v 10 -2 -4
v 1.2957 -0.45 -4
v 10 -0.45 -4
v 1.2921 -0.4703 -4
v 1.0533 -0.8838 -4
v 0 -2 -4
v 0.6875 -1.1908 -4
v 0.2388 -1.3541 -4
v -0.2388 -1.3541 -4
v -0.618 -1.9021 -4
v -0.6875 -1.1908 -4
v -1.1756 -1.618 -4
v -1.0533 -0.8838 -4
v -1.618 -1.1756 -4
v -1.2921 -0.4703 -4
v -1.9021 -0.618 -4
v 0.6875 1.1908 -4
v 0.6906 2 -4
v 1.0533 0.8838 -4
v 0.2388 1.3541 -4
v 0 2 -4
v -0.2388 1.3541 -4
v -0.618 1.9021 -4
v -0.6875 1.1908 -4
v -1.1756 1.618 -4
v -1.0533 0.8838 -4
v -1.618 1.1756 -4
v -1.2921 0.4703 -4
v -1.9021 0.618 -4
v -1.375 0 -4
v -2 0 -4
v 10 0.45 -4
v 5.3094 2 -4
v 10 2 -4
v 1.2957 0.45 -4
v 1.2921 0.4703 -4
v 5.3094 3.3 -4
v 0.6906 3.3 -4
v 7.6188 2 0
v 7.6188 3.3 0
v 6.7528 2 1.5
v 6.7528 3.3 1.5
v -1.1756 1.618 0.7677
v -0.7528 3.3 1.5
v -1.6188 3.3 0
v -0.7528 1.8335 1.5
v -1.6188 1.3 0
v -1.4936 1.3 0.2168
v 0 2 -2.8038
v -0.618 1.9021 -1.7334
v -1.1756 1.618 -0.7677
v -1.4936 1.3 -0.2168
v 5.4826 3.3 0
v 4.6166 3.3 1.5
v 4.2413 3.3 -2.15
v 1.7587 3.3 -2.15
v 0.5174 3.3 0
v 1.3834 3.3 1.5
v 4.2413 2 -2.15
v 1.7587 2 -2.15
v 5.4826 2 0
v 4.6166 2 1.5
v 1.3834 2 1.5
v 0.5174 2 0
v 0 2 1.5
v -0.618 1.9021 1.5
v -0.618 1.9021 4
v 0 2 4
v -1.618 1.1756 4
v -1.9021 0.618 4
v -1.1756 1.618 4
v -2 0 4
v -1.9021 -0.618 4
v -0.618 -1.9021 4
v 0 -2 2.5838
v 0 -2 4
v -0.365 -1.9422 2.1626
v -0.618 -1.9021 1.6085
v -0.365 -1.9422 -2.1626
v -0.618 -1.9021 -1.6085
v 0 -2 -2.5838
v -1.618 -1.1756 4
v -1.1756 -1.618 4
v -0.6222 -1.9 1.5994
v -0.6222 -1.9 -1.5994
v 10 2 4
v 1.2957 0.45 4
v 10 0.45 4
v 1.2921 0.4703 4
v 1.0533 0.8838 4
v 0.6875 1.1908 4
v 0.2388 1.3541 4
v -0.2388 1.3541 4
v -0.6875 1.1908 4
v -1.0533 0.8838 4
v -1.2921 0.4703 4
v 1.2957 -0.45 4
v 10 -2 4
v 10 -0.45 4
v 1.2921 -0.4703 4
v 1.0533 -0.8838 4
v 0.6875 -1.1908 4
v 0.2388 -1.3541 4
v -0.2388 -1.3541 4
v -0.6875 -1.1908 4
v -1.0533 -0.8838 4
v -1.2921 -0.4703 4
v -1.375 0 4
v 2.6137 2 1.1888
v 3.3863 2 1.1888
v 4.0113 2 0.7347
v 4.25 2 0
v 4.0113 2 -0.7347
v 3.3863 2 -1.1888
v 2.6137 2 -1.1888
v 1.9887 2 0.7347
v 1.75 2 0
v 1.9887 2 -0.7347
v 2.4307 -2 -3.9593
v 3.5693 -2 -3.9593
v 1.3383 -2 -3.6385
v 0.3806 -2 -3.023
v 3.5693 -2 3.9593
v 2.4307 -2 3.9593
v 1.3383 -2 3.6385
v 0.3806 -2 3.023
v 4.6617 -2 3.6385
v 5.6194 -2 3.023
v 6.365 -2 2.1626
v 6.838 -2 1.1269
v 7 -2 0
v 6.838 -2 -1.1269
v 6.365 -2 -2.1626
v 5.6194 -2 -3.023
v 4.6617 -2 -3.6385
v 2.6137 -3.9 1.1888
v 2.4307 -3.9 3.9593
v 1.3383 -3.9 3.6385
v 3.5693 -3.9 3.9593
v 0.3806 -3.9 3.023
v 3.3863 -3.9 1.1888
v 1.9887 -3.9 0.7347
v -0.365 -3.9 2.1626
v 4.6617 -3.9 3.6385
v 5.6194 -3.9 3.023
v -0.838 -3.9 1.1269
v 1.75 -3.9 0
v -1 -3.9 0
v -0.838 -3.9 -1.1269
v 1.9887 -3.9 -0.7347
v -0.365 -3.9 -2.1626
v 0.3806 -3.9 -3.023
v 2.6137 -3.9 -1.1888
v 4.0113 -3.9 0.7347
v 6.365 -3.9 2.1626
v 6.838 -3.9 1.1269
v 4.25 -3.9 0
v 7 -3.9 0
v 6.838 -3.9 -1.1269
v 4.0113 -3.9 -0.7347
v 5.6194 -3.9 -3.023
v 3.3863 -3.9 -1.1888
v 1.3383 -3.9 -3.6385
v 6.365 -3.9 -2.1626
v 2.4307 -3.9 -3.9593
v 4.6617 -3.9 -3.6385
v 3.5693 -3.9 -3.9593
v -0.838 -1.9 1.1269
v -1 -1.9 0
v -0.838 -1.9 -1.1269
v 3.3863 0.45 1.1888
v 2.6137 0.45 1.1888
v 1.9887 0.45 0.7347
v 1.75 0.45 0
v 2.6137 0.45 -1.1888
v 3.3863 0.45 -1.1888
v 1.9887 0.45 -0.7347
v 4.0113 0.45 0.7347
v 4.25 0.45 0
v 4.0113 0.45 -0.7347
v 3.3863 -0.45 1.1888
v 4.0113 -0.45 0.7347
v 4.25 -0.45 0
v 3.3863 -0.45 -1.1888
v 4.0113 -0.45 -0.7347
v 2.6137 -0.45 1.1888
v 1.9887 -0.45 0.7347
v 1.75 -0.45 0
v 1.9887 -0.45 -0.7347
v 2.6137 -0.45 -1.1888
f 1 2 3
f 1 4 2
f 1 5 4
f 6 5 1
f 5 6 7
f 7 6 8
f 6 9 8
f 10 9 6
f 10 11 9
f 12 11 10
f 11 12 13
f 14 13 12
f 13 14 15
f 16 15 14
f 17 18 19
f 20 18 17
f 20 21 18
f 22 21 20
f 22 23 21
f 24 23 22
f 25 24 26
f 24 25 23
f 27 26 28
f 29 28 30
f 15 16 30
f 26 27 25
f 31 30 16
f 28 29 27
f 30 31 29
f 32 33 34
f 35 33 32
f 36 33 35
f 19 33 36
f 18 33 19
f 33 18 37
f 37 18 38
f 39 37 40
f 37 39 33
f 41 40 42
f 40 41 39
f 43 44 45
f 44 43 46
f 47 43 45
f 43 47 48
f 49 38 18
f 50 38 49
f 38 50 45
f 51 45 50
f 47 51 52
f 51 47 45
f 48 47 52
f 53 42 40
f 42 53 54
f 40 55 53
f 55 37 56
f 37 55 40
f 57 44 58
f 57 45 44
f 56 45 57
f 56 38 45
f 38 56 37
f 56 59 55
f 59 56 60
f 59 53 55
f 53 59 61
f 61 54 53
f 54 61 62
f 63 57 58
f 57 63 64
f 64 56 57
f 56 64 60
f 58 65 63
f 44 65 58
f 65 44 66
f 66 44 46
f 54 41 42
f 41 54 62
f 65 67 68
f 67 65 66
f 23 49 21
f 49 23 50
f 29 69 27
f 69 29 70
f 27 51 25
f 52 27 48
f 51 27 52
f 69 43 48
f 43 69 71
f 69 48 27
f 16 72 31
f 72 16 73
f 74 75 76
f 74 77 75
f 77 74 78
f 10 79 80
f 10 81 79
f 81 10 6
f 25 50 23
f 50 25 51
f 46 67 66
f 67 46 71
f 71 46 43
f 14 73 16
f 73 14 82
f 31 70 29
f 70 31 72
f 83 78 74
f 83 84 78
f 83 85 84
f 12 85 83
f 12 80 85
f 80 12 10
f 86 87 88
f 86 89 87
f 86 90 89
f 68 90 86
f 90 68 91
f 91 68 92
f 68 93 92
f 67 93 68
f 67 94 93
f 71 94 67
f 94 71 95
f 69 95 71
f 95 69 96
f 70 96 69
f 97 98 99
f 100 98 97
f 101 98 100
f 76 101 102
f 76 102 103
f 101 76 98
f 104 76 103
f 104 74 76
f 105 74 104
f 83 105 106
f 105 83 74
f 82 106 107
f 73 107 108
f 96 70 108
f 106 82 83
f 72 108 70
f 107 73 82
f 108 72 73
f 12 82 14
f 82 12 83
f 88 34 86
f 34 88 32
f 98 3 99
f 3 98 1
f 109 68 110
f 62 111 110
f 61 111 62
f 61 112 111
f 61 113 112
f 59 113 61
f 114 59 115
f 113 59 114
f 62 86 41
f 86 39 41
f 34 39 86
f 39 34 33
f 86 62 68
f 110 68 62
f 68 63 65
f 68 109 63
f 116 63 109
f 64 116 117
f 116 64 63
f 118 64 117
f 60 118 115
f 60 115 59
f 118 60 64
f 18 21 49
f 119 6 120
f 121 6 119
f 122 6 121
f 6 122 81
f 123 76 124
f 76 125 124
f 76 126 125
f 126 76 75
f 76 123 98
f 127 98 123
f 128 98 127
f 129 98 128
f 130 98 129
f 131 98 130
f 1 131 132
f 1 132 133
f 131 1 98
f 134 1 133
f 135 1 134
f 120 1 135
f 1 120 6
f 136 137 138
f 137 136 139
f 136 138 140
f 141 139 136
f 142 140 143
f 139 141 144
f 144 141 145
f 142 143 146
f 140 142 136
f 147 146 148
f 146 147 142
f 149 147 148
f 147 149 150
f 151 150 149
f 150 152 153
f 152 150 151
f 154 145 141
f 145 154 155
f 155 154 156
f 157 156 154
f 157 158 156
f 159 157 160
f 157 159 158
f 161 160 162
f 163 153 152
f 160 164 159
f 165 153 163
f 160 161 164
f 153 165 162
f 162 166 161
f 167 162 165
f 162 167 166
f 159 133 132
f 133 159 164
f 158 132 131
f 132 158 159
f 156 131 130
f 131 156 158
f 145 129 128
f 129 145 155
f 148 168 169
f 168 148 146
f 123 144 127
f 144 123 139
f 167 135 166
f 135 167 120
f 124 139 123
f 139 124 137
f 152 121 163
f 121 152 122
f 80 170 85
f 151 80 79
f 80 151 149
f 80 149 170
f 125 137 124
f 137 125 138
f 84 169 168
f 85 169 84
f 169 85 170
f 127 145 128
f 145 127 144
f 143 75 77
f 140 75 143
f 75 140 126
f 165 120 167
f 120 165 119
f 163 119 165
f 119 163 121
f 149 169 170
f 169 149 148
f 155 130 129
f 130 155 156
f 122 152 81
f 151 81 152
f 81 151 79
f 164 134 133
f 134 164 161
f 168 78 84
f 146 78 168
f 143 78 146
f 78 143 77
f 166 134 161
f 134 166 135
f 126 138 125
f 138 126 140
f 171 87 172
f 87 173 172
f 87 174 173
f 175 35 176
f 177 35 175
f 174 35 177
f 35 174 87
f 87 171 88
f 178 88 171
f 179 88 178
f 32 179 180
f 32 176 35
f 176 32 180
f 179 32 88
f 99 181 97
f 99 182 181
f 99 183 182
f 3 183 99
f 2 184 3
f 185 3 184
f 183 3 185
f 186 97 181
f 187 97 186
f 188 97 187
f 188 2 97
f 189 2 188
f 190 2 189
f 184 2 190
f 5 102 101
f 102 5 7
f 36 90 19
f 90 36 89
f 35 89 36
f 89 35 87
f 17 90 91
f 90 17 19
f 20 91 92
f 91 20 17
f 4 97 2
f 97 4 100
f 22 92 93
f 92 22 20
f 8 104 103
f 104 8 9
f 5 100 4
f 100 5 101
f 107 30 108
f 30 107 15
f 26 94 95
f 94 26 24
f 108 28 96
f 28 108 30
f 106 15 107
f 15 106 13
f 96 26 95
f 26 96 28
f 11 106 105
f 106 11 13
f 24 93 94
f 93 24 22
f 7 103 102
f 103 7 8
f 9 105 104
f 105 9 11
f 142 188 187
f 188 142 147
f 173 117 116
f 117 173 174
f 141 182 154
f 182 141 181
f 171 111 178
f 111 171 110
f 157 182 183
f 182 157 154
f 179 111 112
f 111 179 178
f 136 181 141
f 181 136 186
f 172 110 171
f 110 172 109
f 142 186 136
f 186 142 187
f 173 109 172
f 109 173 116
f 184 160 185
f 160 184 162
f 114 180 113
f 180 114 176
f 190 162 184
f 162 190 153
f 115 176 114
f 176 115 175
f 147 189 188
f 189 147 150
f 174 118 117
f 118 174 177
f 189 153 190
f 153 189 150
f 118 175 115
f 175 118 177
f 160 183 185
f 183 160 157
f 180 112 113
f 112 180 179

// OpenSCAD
module holder() {
	
	m2_diameter = 2.5; // would be 2
	m2_nut_size = 4.3; // would be 4 acutally

	outer_diameter = 2;
	
	height = 8; // must be greater than nut_size

	screw_diameter = m2_diameter;
	nut_size = m2_nut_size;
	nut_height = 2;

	length = 10;
	screw_offset_x = 5;

	rod_diameter = 2.75;			

	gap = 0.9;	

	translate([-outer_diameter, -outer_diameter, -height/2])
	
	difference()
	{

		union()
		{
			translate([outer_diameter, outer_diameter, 0])
			cylinder(h = height, r = outer_diameter, $fn = 20);
			
			translate([outer_diameter, 0, 0])
			cube([length, outer_diameter*2, height]);
			
			// nut
			translate([screw_offset_x, outer_diameter*2+1.3, height/2])
			rotate([90,0,0])
			rotate([0,0,0])

			difference() {
	  		   	cylinder(r = height/sqrt(3), h=nut_height, $fn=6);	
				cylinder(r = nut_size/sqrt(3), h=height/2, center=true, $fn=6);
				// uncomment for smaller nut outline
				translate([-5, 1.5, 0])
				cube([10,15,20]);
			}

			// screw 
	  		translate([screw_offset_x, -0.9, height/2])
			rotate([-90,0,0])
	  		cylinder(r1=height/2, r2=height/2, h=nut_height, center=true, $fn=22);
		}	
	
		// gap
		translate([length/2-2, outer_diameter-gap/2, -1])
		cube([length, gap, height+1.1]);
	
		// rod hole
		translate([outer_diameter, outer_diameter, -0.1])
		cylinder(h=height*2, r=rod_diameter/2, $fn = 18);
		
		// screw hole
		translate([screw_offset_x, screw_offset_x, height/2])
		rotate([90, 0, 0])
		cylinder(h = 2 * (outer_diameter + nut_height * 2), r = screw_diameter/2, $fn = 10);
	
	
	}
}

holder();
